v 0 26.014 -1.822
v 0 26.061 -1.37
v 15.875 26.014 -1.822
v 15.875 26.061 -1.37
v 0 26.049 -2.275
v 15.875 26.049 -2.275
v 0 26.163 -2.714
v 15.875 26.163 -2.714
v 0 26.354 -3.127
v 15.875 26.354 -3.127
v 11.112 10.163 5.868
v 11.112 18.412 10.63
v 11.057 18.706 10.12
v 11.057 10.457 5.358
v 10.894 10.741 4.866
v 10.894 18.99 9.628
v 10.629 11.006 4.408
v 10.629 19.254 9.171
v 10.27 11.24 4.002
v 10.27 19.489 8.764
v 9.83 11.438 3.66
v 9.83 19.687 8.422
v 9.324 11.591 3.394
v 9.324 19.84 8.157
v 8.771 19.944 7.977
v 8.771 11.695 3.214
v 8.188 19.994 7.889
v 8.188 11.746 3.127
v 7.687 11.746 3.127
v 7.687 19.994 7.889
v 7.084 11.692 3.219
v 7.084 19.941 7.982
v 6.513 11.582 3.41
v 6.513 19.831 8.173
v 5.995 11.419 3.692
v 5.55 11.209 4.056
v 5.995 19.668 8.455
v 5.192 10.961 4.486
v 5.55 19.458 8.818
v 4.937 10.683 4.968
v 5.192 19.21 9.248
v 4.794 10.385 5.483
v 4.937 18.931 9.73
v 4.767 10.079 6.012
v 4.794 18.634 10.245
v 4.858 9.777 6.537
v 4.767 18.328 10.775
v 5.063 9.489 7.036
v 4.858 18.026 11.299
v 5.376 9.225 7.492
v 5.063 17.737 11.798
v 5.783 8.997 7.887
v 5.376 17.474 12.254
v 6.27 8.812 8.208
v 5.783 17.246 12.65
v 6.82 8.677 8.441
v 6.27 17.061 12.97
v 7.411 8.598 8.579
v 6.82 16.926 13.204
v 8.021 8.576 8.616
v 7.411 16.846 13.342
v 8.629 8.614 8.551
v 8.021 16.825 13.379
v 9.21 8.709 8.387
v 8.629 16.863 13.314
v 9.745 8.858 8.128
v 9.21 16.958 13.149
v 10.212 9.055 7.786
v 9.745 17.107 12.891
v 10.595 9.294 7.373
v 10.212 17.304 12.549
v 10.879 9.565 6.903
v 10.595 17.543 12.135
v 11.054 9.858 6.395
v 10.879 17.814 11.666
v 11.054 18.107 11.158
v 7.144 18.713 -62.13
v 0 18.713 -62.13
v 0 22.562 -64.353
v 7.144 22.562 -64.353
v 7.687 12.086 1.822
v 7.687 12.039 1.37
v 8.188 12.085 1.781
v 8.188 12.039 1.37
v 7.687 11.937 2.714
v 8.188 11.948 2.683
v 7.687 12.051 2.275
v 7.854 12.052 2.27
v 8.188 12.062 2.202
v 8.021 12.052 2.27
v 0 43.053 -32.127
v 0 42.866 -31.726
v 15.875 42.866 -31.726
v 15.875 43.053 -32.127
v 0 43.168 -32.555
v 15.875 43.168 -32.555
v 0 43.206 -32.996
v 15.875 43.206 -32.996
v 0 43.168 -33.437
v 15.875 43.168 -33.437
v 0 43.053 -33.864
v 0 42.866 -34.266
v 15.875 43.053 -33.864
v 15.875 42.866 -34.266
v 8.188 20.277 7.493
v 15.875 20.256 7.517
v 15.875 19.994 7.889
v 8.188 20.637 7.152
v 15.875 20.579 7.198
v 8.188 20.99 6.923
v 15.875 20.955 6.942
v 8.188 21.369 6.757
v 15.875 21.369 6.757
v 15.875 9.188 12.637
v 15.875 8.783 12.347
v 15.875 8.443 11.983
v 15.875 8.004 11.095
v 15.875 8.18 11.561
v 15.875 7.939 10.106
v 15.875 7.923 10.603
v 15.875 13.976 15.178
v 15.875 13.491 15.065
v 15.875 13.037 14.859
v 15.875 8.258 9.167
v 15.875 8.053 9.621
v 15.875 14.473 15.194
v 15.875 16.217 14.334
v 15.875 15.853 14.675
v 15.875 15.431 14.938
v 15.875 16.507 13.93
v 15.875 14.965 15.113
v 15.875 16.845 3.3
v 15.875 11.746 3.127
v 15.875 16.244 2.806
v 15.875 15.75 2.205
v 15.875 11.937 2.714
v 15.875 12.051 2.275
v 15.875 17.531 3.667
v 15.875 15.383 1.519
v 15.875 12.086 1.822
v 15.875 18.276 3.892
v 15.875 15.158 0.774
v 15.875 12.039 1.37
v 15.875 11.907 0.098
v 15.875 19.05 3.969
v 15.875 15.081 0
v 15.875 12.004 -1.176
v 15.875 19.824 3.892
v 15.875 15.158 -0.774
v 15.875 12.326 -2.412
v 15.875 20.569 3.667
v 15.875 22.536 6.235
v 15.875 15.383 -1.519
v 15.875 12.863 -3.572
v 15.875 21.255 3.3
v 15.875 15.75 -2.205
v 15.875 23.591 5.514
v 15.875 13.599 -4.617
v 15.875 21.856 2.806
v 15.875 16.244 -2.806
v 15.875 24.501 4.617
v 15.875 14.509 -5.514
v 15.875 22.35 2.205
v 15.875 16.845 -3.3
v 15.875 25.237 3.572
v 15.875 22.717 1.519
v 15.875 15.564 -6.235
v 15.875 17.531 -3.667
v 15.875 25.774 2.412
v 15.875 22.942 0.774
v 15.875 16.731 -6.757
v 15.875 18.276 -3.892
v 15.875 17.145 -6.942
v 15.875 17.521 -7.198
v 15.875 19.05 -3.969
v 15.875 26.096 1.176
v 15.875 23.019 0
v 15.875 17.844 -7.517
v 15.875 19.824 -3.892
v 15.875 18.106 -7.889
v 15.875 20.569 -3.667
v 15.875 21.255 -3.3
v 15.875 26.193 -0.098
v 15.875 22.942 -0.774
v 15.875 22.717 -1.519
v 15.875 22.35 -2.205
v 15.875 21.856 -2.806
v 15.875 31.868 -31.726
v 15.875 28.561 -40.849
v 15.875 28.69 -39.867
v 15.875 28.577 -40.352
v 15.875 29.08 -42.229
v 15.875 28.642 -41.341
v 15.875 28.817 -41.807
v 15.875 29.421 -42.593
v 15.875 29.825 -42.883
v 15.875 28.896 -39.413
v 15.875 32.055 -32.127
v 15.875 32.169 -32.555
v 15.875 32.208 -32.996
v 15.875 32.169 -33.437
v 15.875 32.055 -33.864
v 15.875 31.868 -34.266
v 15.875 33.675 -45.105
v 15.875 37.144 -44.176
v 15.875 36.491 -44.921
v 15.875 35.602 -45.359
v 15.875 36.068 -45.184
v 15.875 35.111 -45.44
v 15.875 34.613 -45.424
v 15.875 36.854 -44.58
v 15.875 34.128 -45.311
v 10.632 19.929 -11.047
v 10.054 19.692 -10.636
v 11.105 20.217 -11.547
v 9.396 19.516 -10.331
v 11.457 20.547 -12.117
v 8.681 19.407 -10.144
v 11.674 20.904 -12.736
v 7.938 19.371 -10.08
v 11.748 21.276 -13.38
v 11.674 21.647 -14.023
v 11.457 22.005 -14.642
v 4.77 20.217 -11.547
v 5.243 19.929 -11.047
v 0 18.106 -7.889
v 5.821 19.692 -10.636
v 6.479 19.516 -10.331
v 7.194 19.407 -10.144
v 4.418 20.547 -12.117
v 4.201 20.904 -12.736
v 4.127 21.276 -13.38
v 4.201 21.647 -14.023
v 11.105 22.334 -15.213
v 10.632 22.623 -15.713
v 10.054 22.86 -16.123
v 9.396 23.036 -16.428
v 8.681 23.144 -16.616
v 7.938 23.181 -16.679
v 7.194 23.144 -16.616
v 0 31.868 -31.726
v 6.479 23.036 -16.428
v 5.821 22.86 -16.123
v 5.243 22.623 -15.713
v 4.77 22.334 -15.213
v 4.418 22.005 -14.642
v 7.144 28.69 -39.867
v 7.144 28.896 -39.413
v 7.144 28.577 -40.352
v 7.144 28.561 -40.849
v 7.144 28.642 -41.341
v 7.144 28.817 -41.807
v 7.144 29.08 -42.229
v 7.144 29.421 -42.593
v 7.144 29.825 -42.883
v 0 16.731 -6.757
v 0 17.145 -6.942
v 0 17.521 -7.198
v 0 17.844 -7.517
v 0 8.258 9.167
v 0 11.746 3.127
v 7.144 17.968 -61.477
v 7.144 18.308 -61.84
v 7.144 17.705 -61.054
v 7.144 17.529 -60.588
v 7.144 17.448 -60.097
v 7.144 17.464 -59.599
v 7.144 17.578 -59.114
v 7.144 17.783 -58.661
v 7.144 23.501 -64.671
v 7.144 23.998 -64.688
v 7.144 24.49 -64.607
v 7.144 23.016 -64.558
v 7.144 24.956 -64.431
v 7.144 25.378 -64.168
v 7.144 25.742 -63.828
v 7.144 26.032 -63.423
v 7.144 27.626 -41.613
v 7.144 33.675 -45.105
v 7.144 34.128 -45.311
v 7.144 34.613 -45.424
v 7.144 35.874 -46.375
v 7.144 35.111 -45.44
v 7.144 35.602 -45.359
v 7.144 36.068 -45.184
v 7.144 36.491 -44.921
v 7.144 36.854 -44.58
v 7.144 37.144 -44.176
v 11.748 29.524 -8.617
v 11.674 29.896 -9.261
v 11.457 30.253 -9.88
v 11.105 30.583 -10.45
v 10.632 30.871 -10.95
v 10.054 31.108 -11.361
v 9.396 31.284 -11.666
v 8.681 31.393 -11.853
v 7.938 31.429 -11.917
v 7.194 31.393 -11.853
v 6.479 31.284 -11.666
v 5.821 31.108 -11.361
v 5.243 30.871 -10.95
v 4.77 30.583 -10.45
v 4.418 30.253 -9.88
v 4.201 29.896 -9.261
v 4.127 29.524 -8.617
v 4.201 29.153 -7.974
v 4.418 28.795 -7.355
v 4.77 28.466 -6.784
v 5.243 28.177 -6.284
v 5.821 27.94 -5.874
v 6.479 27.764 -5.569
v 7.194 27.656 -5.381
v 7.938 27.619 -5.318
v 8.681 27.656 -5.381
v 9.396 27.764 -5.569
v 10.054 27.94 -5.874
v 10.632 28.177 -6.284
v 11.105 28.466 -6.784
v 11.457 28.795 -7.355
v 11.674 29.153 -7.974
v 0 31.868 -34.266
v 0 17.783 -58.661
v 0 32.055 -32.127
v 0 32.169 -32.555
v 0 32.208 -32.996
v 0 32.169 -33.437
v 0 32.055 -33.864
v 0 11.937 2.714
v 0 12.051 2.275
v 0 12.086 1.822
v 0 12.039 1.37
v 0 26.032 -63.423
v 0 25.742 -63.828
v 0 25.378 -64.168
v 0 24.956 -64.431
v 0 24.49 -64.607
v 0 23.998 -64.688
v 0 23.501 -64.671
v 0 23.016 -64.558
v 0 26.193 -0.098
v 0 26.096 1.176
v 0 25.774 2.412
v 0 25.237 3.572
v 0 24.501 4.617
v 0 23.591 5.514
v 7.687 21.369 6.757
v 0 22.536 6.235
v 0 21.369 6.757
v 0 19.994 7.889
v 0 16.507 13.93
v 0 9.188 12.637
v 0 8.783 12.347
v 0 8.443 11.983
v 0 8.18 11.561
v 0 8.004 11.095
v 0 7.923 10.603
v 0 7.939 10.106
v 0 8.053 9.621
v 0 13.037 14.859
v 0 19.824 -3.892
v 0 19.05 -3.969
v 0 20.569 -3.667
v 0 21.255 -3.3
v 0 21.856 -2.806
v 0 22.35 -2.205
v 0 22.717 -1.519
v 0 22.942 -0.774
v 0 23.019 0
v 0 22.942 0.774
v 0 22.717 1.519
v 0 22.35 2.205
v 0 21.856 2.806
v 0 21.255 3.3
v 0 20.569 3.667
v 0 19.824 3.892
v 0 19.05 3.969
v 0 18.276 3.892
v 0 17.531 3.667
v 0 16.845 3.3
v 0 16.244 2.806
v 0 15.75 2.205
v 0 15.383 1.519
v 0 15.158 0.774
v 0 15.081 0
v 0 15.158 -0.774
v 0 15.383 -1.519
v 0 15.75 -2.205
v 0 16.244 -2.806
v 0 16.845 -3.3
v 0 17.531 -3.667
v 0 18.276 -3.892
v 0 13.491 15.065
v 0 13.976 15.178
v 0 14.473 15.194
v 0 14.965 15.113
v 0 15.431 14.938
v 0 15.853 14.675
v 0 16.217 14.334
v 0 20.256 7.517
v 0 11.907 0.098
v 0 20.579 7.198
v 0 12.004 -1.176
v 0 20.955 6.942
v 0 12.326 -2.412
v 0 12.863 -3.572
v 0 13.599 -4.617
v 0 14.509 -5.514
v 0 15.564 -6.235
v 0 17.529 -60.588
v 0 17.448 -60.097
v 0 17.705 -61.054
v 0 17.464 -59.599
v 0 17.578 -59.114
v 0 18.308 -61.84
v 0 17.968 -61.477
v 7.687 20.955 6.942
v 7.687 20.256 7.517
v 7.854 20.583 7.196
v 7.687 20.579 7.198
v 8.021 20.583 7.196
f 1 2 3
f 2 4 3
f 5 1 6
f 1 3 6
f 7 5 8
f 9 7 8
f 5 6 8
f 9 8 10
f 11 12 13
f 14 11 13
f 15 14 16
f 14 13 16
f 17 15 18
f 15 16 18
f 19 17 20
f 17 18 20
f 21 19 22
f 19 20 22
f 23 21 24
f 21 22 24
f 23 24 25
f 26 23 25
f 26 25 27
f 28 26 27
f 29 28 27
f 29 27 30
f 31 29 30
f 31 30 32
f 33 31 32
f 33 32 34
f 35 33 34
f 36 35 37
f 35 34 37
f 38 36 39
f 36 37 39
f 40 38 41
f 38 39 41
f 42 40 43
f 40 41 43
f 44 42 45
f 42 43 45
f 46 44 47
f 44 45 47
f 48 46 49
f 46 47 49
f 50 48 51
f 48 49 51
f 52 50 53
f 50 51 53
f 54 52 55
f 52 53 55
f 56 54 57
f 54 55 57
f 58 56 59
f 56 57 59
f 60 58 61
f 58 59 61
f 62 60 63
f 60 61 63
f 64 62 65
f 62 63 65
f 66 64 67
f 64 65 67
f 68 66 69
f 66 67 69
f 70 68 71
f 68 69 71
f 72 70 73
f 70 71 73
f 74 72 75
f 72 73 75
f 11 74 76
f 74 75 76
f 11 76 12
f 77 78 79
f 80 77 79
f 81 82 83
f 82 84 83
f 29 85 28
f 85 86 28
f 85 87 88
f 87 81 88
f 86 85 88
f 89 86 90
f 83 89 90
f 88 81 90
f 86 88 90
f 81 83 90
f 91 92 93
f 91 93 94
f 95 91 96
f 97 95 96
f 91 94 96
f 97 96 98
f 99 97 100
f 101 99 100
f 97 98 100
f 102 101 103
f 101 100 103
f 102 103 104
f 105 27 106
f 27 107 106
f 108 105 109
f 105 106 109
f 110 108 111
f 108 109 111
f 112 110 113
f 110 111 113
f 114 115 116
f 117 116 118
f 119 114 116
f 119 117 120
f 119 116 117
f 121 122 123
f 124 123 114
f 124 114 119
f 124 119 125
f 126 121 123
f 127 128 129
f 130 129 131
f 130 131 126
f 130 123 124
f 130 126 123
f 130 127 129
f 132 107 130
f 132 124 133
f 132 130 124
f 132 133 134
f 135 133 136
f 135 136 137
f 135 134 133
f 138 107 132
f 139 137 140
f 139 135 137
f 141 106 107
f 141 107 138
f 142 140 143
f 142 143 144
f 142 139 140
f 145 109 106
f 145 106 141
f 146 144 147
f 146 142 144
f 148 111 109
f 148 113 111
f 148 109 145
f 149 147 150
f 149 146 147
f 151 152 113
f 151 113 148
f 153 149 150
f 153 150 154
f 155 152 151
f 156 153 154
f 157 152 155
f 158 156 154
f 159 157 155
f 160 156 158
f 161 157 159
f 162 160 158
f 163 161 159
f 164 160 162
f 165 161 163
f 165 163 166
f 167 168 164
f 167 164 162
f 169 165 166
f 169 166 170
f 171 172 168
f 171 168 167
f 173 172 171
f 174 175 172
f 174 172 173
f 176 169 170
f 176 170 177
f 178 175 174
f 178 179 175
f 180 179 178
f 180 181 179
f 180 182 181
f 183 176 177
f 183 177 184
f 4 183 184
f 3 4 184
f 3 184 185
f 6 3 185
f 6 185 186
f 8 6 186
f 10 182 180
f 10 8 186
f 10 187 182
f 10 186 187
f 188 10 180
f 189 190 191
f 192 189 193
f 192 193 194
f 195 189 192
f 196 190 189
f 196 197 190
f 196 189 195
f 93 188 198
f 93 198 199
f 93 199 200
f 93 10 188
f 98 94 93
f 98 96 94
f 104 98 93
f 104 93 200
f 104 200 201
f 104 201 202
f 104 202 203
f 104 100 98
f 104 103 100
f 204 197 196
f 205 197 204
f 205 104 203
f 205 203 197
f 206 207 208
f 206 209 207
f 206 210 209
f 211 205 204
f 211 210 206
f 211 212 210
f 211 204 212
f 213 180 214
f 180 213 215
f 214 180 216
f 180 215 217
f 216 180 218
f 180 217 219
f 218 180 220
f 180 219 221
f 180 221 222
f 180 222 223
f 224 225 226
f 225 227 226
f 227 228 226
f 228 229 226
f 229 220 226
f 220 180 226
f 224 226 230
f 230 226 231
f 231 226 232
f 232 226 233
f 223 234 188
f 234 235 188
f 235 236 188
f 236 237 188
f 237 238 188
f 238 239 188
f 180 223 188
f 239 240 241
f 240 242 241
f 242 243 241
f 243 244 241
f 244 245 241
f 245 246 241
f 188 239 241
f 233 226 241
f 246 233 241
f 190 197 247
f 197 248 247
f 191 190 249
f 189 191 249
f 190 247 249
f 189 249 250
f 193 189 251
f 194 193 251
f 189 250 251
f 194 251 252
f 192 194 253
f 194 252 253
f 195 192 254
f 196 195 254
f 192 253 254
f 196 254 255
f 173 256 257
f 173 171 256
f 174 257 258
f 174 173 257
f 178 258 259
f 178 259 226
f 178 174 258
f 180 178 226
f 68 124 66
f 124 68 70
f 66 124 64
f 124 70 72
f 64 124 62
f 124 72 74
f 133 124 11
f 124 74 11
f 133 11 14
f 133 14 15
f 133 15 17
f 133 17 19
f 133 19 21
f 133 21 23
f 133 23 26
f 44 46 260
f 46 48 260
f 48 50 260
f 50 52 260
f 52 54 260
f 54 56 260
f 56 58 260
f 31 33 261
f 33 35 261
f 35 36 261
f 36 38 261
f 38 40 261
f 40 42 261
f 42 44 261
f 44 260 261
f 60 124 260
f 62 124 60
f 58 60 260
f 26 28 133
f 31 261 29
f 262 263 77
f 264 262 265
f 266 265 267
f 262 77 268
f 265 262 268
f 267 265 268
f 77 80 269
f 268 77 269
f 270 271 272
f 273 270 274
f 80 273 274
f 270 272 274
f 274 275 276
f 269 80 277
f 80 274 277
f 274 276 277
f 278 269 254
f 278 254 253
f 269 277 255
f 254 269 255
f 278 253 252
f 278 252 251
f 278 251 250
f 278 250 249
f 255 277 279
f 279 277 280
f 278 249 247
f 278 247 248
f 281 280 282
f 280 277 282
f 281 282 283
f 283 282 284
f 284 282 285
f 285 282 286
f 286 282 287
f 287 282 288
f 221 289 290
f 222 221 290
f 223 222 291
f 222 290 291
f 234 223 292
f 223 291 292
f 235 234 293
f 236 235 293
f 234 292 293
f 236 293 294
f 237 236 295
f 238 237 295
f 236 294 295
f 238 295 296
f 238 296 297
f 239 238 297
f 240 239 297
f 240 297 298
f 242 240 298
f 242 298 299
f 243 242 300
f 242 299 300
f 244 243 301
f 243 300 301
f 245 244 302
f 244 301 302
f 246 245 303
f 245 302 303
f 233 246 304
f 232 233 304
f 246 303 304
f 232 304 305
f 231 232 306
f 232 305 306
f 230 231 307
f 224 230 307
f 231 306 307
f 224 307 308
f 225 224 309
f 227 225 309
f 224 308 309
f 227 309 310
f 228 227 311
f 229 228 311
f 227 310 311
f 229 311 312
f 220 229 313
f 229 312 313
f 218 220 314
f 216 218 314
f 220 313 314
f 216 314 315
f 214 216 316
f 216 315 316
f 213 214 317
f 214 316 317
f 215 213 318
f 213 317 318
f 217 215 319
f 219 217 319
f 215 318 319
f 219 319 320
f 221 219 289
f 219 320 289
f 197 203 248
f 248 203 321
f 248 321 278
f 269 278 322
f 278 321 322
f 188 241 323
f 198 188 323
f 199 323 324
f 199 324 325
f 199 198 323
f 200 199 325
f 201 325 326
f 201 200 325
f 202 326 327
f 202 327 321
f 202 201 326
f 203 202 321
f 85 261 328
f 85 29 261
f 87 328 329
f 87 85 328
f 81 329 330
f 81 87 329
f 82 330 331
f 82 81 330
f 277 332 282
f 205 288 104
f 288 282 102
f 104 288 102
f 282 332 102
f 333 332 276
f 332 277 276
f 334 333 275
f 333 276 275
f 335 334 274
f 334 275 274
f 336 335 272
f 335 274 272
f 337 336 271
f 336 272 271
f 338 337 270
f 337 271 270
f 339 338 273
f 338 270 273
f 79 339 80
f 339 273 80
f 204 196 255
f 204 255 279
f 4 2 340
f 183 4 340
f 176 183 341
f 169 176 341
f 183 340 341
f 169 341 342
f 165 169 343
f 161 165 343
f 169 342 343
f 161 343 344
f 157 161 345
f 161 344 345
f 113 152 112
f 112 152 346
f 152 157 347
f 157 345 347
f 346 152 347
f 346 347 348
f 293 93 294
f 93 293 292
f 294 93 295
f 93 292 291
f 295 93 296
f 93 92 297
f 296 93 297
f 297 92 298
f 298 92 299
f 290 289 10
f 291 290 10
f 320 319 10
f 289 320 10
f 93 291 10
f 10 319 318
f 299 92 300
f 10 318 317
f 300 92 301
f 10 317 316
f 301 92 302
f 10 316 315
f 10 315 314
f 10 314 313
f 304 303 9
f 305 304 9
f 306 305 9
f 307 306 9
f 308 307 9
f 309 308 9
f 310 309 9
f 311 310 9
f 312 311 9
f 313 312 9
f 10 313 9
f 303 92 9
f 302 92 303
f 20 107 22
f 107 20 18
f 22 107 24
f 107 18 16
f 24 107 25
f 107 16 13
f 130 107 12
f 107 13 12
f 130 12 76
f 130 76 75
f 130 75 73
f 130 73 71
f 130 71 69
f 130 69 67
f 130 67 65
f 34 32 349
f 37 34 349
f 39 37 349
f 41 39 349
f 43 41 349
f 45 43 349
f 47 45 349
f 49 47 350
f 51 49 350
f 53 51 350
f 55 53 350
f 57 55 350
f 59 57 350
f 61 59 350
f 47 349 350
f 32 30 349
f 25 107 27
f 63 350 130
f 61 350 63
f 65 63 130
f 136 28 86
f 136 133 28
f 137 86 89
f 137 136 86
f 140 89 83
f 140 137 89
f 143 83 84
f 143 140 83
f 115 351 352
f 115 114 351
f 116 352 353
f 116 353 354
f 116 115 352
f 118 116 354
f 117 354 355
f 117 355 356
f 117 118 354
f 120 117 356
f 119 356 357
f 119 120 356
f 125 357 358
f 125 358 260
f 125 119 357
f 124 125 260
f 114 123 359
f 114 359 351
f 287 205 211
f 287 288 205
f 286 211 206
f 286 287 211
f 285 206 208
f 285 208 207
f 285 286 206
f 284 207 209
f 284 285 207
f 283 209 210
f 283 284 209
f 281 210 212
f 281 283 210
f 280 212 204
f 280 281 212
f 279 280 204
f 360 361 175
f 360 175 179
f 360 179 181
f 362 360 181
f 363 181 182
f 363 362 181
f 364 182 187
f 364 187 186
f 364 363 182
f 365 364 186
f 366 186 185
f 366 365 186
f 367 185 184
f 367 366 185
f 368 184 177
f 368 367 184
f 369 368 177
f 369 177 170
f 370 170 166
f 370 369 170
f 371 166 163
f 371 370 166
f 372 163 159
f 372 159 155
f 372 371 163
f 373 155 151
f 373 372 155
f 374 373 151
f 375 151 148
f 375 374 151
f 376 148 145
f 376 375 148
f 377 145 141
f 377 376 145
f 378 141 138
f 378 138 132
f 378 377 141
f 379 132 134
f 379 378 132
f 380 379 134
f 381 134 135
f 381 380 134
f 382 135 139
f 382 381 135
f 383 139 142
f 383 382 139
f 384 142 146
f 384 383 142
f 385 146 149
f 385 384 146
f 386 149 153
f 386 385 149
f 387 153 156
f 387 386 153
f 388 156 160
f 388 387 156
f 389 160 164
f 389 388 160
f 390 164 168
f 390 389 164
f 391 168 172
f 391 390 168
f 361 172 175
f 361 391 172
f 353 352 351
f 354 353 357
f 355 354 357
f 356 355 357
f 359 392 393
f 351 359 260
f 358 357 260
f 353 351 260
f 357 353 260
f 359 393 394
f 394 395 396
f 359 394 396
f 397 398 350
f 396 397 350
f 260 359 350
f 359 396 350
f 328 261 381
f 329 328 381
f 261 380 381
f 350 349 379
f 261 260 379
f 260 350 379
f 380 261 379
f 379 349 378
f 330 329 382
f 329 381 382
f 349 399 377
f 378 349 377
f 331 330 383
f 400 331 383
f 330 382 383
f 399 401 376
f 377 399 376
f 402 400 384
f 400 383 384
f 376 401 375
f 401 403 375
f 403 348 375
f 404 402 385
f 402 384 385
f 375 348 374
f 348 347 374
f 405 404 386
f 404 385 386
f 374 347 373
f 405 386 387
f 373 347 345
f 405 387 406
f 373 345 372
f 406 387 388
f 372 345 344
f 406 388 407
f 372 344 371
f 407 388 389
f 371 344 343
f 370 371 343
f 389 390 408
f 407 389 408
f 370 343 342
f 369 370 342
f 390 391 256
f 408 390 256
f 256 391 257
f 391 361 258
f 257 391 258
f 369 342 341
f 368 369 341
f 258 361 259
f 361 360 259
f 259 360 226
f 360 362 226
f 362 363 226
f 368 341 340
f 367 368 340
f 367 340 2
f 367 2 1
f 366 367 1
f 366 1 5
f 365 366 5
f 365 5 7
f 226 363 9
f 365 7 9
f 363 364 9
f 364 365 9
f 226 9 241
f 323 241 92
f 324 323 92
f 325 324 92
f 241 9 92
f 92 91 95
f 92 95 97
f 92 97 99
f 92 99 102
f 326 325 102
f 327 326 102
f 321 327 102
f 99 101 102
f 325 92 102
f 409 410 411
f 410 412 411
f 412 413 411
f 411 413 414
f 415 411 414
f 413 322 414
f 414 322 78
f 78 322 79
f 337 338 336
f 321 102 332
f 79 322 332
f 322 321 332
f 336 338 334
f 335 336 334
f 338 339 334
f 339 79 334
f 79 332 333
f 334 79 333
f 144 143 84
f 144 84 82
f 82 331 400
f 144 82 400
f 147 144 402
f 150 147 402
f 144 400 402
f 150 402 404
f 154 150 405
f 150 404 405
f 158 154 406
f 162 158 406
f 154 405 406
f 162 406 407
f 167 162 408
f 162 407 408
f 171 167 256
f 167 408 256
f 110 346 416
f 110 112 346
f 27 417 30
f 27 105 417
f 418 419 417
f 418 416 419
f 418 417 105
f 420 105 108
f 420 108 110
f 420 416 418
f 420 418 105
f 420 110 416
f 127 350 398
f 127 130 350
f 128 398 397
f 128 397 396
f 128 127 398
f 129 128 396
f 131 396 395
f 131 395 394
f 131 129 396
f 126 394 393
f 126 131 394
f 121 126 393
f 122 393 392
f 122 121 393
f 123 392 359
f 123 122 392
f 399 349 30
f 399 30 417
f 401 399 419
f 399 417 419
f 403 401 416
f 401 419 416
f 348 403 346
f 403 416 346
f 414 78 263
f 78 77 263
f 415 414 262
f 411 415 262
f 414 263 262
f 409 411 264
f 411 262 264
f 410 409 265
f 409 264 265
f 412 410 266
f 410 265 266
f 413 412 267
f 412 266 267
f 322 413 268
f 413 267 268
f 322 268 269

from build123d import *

# Parameters (mm, degrees)
SKETCH1_R           = 3.96875
BOSS_EXTRUDE1_DEPTH = 15.875
SKETCH2_R           = 3.175
SKETCH2_R_2         = 3.81
CUT_EXTRUDE1_DEPTH  = 9.525
CUT_EXTRUDE2_DEPTH  = 8.73125
FILLET1_R           = 2.54


with BuildPart() as part:
    # Sketch1 → Boss-Extrude1 (new body)
    with BuildSketch(Plane(origin=(0, 0, 0), x_dir=(0, 0, -1), z_dir=(1, 0, 0))):
        with BuildLine():
            ThreePointArc((-2.230020797, 12.263235579), (-6.186668978, 15.478125), (-6.992520797, 20.51212755))
            Line((-6.992520797, 20.51212755), (-16.129403285, 15.236945986))
            Line((-16.129403285, 15.236945986), (-11.366903285, 6.988054014))
            Line((-11.366903285, 6.988054014), (-2.230020797, 12.263235579))
        make_face()
        with BuildLine():
            Line((-6.992520797, 20.51212755), (2.230020797, 25.836764421))
            ThreePointArc((2.230020797, 25.836764421), (-3.571875, 25.236668978), (-6.992520797, 20.51212755))
        make_face()
        with BuildLine():
            Line((6.992520797, 17.58787245), (-2.230020797, 12.263235579))
            ThreePointArc((-2.230020797, 12.263235579), (3.571875, 12.863331022), (6.992520797, 17.58787245))
        make_face()
        with BuildLine():
            Line((65.622755111, 24.761945986), (32.995567884, 43.599261314))
            Line((32.995567884, 43.599261314), (2.230020797, 25.836764421))
            ThreePointArc((2.230020797, 25.836764421), (5.786357884, 23.239418396), (7.14375, 19.05))
            ThreePointArc((7.14375, 19.05), (7.105842121, 18.315036184), (6.992520797, 17.58787245))
            Line((6.992520797, 17.58787245), (32.995567884, 32.600738686))
            Line((32.995567884, 32.600738686), (60.860255111, 16.513054014))
            Line((60.860255111, 16.513054014), (65.622755111, 24.761945986))
        make_face()
        with BuildLine():
            ThreePointArc((7.14375, 19.05), (5.786357884, 23.239418396), (2.230020797, 25.836764421))
            Line((2.230020797, 25.836764421), (-6.992520797, 20.51212755))
            ThreePointArc((-6.992520797, 20.51212755), (-6.186668978, 15.478125), (-2.230020797, 12.263235579))
            Line((-2.230020797, 12.263235579), (6.992520797, 17.58787245))
            ThreePointArc((6.992520797, 17.58787245), (7.105842121, 18.315036184), (7.14375, 19.05))
        make_face()
        with Locations((0, 19.05)):
            Circle(SKETCH1_R, mode=Mode.SUBTRACT)
    extrude(amount=BOSS_EXTRUDE1_DEPTH)

    # Sketch2 → Cut-Extrude1 (cut)
    with BuildSketch(Plane(origin=(0, 18.411945986, 10.630141971), x_dir=(1, 0, 0), z_dir=(0, 0.866025404, 0.5))):
        with Locations((7.9375, 0)):
            Circle(SKETCH2_R)
        with Locations((7.9375, 22.225)):
            Circle(SKETCH2_R_2)
    extrude(amount=-CUT_EXTRUDE1_DEPTH, mode=Mode.SUBTRACT)

    # Sketch3 → Cut-Extrude2 (cut)
    with BuildSketch(Plane(origin=(15.875, 0, 0), x_dir=(0, 0, -1), z_dir=(1, 0, 0))):
        Polygon((65.622755111, 24.761945986), (60.860255111, 16.513054014), (41.612840512, 27.625554014), (46.375340512, 35.874445986), align=None)
    extrude(amount=-CUT_EXTRUDE2_DEPTH, mode=Mode.SUBTRACT)

    # Fillet1
    fillet1_edges = [part.edges().sort_by_distance(p)[0] for p in [
        (7.9375, 6.988054014, 11.366903285),
        (7.9375, 15.236945986, 16.129403285),
        (7.9375, 20.51212755, 6.992520797),
        (7.9375, 25.836764421, -2.230020797),
        (7.9375, 43.599261314, -32.995567884),
        (7.9375, 32.600738686, -32.995567884),
        (7.9375, 17.58787245, -6.992520797),
        (7.9375, 12.263235579, 2.230020797),
        (3.571875, 24.761945986, -65.622755111),
        (3.571875, 16.513054014, -60.860255111),
        (11.509375, 35.874445986, -46.375340512),
        (11.509375, 27.625554014, -41.612840512),
    ]]
    fillet(fillet1_edges, radius=FILLET1_R)


solid = part.part
